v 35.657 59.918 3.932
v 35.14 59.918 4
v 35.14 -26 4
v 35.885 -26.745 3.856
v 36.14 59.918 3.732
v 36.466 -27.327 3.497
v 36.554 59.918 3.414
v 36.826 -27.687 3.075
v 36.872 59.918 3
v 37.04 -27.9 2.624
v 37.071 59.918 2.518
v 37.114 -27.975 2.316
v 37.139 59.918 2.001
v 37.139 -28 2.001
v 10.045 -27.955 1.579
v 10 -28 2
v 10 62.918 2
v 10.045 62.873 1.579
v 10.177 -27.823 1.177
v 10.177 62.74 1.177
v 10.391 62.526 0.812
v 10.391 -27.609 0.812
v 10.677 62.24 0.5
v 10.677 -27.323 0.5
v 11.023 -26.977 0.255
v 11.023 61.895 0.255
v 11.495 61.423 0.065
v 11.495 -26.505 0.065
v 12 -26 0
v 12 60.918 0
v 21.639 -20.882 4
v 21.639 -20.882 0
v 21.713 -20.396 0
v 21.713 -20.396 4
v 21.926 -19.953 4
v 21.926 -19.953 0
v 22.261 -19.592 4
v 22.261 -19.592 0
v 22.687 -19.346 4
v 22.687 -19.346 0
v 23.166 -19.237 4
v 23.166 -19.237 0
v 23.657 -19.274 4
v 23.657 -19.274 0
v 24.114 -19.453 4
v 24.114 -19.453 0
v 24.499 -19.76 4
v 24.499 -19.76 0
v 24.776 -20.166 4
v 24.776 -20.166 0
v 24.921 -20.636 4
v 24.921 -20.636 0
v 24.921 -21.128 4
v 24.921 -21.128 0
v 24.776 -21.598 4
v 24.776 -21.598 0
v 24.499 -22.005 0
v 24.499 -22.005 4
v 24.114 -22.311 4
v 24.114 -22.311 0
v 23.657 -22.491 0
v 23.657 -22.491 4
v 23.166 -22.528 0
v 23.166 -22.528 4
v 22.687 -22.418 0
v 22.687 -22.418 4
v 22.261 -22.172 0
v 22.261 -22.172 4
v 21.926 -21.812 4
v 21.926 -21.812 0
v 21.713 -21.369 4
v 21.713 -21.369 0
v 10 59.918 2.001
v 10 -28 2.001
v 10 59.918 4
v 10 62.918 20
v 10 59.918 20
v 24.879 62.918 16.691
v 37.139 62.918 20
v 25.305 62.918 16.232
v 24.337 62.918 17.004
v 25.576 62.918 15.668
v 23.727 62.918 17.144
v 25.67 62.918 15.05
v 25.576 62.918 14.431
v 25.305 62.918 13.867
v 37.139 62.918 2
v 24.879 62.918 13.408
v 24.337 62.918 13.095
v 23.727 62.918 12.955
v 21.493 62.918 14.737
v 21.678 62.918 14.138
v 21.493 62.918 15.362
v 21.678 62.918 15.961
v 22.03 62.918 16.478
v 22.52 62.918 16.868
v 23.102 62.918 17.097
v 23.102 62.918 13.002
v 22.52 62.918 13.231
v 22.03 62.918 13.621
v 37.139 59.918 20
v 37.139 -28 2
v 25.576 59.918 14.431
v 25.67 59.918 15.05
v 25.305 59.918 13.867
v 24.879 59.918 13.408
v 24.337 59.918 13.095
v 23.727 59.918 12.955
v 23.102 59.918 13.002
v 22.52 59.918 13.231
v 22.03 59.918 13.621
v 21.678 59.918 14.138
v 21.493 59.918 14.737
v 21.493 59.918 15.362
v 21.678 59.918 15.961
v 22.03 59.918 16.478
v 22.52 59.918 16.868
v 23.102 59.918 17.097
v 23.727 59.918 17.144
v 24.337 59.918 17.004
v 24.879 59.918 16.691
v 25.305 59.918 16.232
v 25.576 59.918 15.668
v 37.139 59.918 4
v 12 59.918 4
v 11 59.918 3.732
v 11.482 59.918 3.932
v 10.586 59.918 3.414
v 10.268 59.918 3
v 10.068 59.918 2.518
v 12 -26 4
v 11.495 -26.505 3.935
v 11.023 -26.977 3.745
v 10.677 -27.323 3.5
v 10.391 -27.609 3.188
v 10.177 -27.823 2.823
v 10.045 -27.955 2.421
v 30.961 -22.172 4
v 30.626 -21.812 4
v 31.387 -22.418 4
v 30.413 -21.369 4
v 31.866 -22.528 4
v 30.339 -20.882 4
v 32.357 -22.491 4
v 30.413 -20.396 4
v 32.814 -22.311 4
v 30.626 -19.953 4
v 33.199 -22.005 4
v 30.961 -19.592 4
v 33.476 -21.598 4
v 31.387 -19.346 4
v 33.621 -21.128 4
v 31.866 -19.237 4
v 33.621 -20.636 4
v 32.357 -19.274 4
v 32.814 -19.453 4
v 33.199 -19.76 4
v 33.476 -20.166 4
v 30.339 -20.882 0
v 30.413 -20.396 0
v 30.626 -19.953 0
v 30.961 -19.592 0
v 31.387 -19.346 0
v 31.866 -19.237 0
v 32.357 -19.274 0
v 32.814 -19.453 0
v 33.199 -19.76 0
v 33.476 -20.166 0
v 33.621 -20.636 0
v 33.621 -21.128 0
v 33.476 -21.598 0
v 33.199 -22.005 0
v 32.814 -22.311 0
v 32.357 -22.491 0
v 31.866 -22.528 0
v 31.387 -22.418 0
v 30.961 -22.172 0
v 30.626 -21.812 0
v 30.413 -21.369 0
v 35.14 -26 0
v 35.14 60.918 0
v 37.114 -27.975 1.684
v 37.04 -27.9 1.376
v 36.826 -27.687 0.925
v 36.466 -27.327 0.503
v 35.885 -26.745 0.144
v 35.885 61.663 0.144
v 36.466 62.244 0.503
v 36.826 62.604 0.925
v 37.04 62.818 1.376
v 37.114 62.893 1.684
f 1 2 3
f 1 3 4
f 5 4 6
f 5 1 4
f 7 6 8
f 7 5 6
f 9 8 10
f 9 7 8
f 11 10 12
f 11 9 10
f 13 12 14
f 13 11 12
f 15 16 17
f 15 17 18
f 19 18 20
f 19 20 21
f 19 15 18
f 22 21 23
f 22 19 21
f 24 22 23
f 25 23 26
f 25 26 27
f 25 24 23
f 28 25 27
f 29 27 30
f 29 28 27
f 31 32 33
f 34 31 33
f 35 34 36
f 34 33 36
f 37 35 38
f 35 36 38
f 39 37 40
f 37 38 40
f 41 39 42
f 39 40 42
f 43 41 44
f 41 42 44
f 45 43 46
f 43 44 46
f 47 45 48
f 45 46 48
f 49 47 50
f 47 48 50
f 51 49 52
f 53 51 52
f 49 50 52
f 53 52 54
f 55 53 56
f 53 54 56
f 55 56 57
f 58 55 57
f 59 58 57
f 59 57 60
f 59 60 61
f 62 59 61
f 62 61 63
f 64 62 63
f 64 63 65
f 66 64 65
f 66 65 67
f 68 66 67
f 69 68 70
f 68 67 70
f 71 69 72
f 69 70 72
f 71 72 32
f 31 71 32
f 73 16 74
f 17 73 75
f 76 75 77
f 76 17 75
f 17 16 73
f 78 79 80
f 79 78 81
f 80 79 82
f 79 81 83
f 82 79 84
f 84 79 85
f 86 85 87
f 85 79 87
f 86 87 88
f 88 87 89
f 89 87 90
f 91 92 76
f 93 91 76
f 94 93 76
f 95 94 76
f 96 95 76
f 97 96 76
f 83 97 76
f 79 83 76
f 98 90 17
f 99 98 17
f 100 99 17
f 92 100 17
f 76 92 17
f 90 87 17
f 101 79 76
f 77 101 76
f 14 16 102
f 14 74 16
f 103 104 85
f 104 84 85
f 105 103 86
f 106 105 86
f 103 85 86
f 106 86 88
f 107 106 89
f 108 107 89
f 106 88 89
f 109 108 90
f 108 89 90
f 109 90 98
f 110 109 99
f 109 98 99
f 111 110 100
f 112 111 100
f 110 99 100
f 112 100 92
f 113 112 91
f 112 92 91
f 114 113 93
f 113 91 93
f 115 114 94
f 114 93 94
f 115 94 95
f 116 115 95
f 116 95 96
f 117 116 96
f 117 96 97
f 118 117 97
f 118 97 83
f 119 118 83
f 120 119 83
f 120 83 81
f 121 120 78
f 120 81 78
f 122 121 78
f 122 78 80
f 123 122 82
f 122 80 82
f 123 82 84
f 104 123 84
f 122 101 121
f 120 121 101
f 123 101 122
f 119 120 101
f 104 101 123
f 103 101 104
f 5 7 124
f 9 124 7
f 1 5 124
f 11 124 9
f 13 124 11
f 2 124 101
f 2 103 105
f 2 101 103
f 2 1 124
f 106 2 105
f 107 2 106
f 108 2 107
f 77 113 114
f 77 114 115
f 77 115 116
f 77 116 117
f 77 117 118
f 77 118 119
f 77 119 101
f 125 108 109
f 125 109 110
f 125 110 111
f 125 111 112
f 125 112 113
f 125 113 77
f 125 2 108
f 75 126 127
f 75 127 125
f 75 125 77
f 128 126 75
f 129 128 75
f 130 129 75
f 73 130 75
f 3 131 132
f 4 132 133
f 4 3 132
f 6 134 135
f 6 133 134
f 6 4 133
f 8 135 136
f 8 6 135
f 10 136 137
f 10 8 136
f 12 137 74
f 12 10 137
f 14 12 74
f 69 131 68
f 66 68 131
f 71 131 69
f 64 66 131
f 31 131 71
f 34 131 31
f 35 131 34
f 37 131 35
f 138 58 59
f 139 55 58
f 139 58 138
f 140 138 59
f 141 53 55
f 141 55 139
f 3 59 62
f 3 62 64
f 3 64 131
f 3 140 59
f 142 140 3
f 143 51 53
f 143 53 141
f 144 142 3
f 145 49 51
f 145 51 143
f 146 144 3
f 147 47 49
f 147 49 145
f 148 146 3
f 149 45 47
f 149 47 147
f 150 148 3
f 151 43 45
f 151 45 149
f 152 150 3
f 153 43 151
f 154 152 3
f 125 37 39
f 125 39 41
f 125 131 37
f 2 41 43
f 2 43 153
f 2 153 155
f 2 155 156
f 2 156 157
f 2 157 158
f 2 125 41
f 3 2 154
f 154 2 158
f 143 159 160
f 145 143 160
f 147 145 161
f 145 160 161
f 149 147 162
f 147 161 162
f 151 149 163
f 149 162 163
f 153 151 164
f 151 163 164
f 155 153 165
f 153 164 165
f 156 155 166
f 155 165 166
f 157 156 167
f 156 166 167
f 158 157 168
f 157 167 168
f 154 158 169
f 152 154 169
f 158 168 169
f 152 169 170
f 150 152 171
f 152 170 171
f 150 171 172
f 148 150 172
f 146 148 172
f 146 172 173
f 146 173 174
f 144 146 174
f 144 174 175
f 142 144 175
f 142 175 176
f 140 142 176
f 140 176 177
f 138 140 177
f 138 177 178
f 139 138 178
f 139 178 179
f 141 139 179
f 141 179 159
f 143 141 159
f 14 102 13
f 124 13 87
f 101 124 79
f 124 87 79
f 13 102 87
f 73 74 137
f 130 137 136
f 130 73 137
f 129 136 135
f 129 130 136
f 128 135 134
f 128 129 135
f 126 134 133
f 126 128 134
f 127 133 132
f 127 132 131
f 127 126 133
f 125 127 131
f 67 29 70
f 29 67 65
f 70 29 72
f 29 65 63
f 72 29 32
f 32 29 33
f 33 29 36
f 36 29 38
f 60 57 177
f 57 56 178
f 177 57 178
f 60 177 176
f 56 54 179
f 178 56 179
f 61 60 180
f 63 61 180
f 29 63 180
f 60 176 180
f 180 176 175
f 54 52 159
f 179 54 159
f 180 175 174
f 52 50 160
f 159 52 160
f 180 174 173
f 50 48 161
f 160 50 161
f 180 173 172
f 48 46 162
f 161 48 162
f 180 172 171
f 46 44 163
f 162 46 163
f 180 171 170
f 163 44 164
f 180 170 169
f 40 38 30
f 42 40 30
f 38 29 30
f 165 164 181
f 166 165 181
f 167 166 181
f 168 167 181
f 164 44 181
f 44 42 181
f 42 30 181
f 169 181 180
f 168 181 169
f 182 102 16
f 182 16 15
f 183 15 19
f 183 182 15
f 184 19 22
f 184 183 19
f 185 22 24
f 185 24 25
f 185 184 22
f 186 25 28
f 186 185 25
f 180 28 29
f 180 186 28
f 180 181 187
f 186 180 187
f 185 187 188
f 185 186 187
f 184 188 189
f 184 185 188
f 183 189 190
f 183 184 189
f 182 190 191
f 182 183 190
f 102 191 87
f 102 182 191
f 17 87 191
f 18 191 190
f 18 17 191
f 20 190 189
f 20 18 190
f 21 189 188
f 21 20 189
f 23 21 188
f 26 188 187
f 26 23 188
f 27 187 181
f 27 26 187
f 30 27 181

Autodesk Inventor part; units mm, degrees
ref_plane "YZ Plane" through (0, 0, 0) normal (1, 0, 0) x (0, 1, 0)
ref_plane "XZ Plane" through (0, 0, 0) normal (0, 1, 0) x (-1, 0, 0)
ref_plane "XY Plane" through (0, 0, 0) normal (0, 0, 1) x (1, 0, 0)
sketch "Skizze1" plane through (0, 0, 0) normal (0, 0, 1) x (1, 0, 0)
  line L0 (10, 15) -> (45.7133, 15) construction
  line L1 (10, 15) -> (10, -10) construction
  line L2 (37.1394, -10) -> (10, -10) construction
  line L3 (37.1394, -10) -> (37.1394, 14.1) construction
  line L4 (37.1394, 14.1) -> (45.7133, 14.1) construction
  line L5 (45.7133, 14.1) -> (45.7133, 15) construction
  line L6 (10, -10) -> (37.1394, -10)
  line L7 (37.1394, -10) -> (37.1394, 59.9176)
  line L8 (37.1394, 59.9176) -> (10, 59.9176)
  line L9 (10, 59.9176) -> (10, -10)
  point P0 (0, 0)
extrude "Extrusion1" add sketch "Skizze1" along normal blind 4
sketch "Skizze2" plane through (0, 0, 0) normal (0, 0, -1) x (-1, 0, 0)
  line L0 (-37.1394, 59.9176) -> (-10, 59.9176) projected
  line L1 (-10, 59.9176) -> (-37.1394, 59.9176)
  line L2 (-37.1394, 59.9176) -> (-37.1394, 62.9176)
  line L3 (-37.1394, 62.9176) -> (-10, 62.9176)
  line L4 (-10, 62.9176) -> (-10, 59.9176)
  point P0 (0, 0)
  dimension "d2" = 3
extrude "Extrusion2" add sketch "Skizze2" against normal blind 20
sketch "Skizze4" plane through (10, 62.9176, 0) normal (0, 1, 0) x (1, 0, 0)
  line L0 (27.1394, -4) -> (27.1394, -73.6709) construction
  line L1 (-71.0464, -73.5081) -> (53.1741, -73.5081) construction
  line L2 (53.1741, -72.4315) -> (53.1741, -73.5081) construction
  arc A0 (58.1741, -67.4315) -> (53.1741, -72.4315) centre (58.1741, -72.4315) ccw construction
  line L3 (62.2394, -67.4315) -> (58.1741, -67.4315) construction
  line L4 (62.2394, -59.1955) -> (62.2394, -67.4315) construction
  arc A1 (65.5394, -59.1955) -> (62.2394, -59.1955) centre (63.8894, -59.1955) ccw construction
  line L5 (65.5394, -67.4315) -> (65.5394, -59.1955) construction
  line L6 (81.2394, -67.4315) -> (65.5394, -67.4315) construction
  arc A2 (76.4341, -48.82) -> (81.2394, -67.4315) centre (125.2788, -46.1349) ccw construction
  arc A3 (76.4267, -48.4999) -> (76.4341, -48.82) centre (81.4265, -48.5455) ccw construction
  arc A4 (76.4267, -48.4999) -> (35.4184, -9) centre (29.7163, -55.9569) ccw construction
  line L7 (35.4184, -9) -> (-5, -9) construction
  line L8 (-5, -9) -> (-5, 9.9226) construction
  line L9 (-5, 9.9226) -> (-10, 9.9226) construction
  line L10 (-10, 9.9226) -> (-10, 9.9096) construction
  line L11 (-10, 9.9096) -> (-37.7867, 9.9096) construction
  arc A5 (-37.7867, 9.9096) -> (-54.9732, -24.6463) centre (-14.5965, -23.176) ccw construction
  arc A6 (-54.9732, -24.6463) -> (-71.0464, -73.5081) centre (23.4557, -77.5201) ccw construction
  arc A7 (-40.4634, -62.3724) -> (-28.4634, -62.3724) centre (-34.4634, -62.3724) ccw construction
  line L12 (-40.4634, -62.3724) -> (-40.4634, -47.5724) construction
  arc A8 (-28.4634, -47.5724) -> (-40.4634, -47.5724) centre (-34.4634, -47.5724) ccw construction
  line L13 (-28.4634, -47.5724) -> (-28.4634, -62.3724) construction
  arc A9 (-40.4634, -16.9802) -> (-28.4634, -16.9802) centre (-34.4634, -16.9802) ccw construction
  line L14 (-40.4634, -16.9802) -> (-40.4634, -2.1802) construction
  arc A10 (-28.4634, -2.1802) -> (-40.4634, -2.1802) centre (-34.4634, -2.1802) ccw construction
  line L15 (-28.4634, -2.1802) -> (-28.4634, -16.9802) construction
  line L16 (37.2394, -63.0832) -> (59.5394, -63.0832) construction
  line L17 (37.2394, -34.3078) -> (37.2394, -63.0832) construction
  arc A11 (59.5394, -34.3078) -> (37.2394, -34.3078) centre (48.3894, -34.3078) ccw construction
  line L18 (59.5394, -63.0832) -> (59.5394, -34.3078) construction
  arc A12 (62.2394, -38.1955) -> (65.5394, -38.1955) centre (63.8894, -38.1955) ccw construction
  line L19 (62.2394, -28.1955) -> (62.2394, -38.1955) construction
  arc A13 (65.5394, -28.1955) -> (62.2394, -28.1955) centre (63.8894, -28.1955) ccw construction
  line L20 (65.5394, -38.1955) -> (65.5394, -28.1955) construction
  arc A14 (34.5394, -59.1955) -> (31.2394, -59.1955) centre (32.8894, -59.1955) ccw construction
  line L21 (34.5394, -67.4315) -> (34.5394, -59.1955) construction
  line L22 (31.2394, -67.4315) -> (34.5394, -67.4315) construction
  line L23 (31.2394, -59.1955) -> (31.2394, -67.4315) construction
  arc A15 (31.2394, -38.1955) -> (34.5394, -38.1955) centre (32.8894, -38.1955) ccw construction
  line L24 (31.2394, -28.1955) -> (31.2394, -38.1955) construction
  arc A16 (34.5394, -28.1955) -> (31.2394, -28.1955) centre (32.8894, -28.1955) ccw construction
  line L25 (34.5394, -38.1955) -> (34.5394, -28.1955) construction
  line L26 (0, -4) -> (0, -78.5081) construction
  line L27 (27.1394, -20) -> (0, -20) construction
  circle A17 centre (13.5697, -15.0495) radius 2.1
  point P0 (-10, 0)
  dimension "d11" = 4.2
extrude "Extrusion4" cut sketch "Skizze4" against normal through all
sketch "Skizze5" plane through (10, -10, 0) normal (0, -1, 0) x (1, 0, 0)
  line L0 (0, 0) -> (27.1394, 0) projected
  line L1 (27.1394, 0) -> (27.1394, 4) projected
  line L2 (0, 4) -> (27.1394, 4) projected
  line L3 (0, 0) -> (0, 4) projected
  point P0 (-10, 0)
extrude "Extrusion5" add sketch "Skizze5" along normal blind 18
sketch "Skizze6" plane through (0, 0, 0) normal (0, 0, -1) x (-1, 0, 0)
  arc A0 (-23.2894, -22.5324) -> (-23.2894, -19.2324) centre (-23.2894, -20.8824) ccw construction
  arc A1 (-31.9894, -19.2324) -> (-31.9894, -22.5324) centre (-31.9894, -20.8824) ccw construction
  circle A2 centre (-31.9894, -20.8824) radius 1.65
  circle A3 centre (-23.2894, -20.8824) radius 1.65
  point P0 (0, 0)
extrude "Extrusion6" cut sketch "Skizze6" against normal through all
fillet "Rundung3" radius 2 7 edges at (37.1394, 17.4588, 0) (23.5697, -28, 0) (10, 17.4588, 0) (37.1394, 15.9588, 4) (23.5697, -28, 4) (23.5697, 62.9176, 0) (10, 15.9588, 4)
properties part number "Chain_fixture"
